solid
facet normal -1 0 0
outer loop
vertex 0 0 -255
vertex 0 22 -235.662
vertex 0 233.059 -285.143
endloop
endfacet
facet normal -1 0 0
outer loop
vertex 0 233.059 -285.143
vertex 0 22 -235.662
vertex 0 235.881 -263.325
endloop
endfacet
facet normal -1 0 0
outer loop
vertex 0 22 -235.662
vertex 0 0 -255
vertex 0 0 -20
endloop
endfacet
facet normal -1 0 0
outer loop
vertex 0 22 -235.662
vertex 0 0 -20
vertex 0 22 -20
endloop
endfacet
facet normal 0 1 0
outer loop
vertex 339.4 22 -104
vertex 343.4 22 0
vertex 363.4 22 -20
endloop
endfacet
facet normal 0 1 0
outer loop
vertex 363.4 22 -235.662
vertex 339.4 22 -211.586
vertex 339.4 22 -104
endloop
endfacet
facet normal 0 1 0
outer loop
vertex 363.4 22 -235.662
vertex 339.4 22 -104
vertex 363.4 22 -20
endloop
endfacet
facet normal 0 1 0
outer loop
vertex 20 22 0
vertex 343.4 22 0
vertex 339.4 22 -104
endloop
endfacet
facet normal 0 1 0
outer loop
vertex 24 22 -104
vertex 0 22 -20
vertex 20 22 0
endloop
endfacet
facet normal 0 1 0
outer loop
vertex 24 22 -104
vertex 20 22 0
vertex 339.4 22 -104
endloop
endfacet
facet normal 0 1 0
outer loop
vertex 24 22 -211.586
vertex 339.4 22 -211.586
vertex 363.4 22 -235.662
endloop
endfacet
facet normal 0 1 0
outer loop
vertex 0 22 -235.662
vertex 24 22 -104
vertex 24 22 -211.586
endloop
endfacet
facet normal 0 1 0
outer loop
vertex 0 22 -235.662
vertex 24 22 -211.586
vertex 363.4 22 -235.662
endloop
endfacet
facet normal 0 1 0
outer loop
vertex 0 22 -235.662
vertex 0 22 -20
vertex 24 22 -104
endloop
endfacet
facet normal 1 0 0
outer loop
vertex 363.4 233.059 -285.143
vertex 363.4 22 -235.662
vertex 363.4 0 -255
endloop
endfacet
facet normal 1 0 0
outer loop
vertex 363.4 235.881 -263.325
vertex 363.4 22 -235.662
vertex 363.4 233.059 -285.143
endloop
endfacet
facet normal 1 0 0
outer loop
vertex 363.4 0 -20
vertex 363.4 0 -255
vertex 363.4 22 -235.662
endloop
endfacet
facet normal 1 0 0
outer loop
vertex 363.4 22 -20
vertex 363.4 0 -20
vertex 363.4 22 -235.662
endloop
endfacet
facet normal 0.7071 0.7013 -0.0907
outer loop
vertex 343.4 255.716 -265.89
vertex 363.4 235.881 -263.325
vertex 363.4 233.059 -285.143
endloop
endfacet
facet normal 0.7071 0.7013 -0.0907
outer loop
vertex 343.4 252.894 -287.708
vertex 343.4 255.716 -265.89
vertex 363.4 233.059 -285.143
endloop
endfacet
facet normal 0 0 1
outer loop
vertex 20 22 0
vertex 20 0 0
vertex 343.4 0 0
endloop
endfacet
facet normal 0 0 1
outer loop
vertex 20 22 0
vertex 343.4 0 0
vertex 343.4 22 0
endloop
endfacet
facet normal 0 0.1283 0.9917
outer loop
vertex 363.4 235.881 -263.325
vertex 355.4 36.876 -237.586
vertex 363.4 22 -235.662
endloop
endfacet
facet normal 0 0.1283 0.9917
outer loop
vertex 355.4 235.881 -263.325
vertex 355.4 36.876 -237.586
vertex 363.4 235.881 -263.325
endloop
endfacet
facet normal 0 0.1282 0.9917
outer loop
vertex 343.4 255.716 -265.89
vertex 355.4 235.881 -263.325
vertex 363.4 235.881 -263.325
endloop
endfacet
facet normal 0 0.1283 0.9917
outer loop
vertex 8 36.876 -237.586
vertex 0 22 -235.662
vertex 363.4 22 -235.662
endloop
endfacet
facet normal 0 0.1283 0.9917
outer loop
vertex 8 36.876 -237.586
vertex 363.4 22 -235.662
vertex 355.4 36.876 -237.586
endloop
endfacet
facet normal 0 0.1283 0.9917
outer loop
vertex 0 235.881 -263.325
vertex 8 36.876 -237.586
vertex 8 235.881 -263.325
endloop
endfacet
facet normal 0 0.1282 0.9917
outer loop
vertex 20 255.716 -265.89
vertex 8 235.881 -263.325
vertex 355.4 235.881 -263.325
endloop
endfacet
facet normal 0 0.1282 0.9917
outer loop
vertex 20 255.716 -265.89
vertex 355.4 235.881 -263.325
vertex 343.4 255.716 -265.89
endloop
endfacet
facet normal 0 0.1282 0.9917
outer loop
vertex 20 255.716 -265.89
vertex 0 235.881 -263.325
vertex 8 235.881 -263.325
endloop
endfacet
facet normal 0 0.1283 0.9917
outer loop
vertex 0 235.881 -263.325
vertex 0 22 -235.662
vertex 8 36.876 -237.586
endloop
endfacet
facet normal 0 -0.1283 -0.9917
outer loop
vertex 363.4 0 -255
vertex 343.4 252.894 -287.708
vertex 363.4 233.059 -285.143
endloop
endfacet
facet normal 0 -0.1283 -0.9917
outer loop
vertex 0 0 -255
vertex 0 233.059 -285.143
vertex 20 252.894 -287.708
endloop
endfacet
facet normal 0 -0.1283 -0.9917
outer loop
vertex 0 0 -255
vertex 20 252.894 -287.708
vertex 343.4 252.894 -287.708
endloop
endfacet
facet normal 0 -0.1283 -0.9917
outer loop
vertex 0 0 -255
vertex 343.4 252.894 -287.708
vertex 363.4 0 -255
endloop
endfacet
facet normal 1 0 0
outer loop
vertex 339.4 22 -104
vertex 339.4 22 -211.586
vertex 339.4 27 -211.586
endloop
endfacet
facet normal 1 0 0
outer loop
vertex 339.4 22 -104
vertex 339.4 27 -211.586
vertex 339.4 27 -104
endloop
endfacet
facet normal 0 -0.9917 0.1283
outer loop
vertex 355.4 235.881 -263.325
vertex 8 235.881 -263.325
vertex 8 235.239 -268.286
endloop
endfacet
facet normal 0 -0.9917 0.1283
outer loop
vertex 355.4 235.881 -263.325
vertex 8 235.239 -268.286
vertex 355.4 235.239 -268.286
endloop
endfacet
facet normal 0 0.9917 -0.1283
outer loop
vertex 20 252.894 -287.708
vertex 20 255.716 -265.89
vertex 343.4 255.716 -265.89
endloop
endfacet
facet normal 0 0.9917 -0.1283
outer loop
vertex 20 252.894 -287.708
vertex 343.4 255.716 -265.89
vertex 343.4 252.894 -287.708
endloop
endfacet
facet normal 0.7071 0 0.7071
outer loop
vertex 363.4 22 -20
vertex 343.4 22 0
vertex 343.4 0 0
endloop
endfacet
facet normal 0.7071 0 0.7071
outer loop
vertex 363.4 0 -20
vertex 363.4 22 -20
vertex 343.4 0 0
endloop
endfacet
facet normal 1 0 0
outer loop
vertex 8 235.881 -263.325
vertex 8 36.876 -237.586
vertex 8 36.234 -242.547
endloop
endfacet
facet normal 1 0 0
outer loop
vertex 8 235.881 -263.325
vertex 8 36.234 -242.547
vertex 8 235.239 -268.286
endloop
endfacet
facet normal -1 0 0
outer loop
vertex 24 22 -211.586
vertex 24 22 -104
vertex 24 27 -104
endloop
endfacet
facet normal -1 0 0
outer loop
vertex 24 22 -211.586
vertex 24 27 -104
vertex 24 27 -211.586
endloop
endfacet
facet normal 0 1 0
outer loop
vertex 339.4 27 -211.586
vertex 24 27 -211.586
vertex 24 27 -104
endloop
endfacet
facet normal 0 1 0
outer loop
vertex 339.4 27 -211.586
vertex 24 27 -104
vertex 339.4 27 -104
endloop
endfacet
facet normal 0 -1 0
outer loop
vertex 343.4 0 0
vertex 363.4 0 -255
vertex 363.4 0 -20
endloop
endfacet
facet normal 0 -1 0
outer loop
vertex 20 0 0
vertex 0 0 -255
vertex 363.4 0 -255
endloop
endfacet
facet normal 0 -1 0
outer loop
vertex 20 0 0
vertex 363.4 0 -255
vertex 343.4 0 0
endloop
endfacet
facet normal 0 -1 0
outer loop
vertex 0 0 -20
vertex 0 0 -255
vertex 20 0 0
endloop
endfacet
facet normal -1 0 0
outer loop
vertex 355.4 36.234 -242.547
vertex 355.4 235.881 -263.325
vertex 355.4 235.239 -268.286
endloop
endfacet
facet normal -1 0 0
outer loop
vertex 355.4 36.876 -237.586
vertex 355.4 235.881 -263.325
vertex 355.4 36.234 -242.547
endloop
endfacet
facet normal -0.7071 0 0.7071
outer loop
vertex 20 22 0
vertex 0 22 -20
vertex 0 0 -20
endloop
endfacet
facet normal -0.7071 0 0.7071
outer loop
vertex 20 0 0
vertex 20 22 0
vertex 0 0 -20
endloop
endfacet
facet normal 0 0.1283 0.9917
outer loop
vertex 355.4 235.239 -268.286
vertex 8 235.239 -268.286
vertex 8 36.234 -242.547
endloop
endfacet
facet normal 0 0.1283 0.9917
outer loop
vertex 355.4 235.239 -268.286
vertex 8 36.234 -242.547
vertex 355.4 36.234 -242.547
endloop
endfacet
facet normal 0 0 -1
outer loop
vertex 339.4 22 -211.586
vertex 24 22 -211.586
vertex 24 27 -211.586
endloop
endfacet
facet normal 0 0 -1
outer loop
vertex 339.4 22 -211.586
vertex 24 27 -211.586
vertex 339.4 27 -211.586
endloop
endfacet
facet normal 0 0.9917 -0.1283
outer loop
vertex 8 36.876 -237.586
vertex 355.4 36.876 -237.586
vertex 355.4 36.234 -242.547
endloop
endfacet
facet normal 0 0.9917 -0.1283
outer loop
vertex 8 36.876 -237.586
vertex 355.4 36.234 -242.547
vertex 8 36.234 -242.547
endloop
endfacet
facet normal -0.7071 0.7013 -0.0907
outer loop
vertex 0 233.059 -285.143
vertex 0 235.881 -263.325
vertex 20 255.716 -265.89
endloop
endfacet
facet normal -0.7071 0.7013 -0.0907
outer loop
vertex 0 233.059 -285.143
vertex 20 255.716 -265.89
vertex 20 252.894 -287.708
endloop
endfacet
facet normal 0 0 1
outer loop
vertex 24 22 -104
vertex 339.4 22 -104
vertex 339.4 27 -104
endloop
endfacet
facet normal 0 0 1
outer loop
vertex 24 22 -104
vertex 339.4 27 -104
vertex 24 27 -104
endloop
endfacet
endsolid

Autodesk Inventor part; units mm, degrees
ref_plane "YZ Plane" through (0, 0, 0) normal (1, 0, 0) x (0, 1, 0)
ref_plane "XZ Plane" through (0, 0, 0) normal (0, 1, 0) x (-1, 0, 0)
ref_plane "XY Plane" through (0, 0, 0) normal (0, 0, 1) x (1, 0, 0)
sketch "Sketch1" plane through (0, 0, 0) normal (1, 0, 0) x (0, 1, 0)
  line L0 (0, 0) -> (22, 0)
  line L1 (22, 0) -> (22, -255)
  line L2 (22, -255) -> (0, -255)
  line L3 (0, -255) -> (0, 0)
  line L4 (0, -255) -> (2.8219, -233.1817)
  line L5 (2.8219, -233.1817) -> (255.7155, -265.8902)
  line L6 (255.7155, -265.8902) -> (252.8936, -287.7085)
  line L7 (252.8936, -287.7085) -> (0, -255)
  point P0 (22, -235.6622)
  dimension "d0" = 22
  dimension "d1" = 255
  dimension "d2" = 22
  dimension "d3" = 255
extrude "Extrusion1" add sketch "Sketch1" along normal blind 363.4
chamfer "Chamfer1" distance 20 angle 45 4 edges at (363.4, 254.3045, -276.7993) (0, 254.3045, -276.7993) (363.4, 11, 0) (0, 11, 0)
sketch "Sketch2" plane through (0, 22, -235.6622) normal (0, 0.1282685, 0.9917395) x (1, 0, 0)
  line L0 (8, 215.6622) -> (355.4, 215.6622)
  line L1 (355.4, 215.6622) -> (355.4, 15)
  line L2 (355.4, 15) -> (8, 15)
  line L3 (8, 15) -> (8, 215.6622)
  line L4 (0, 215.6622) -> (0, 0) projected
  line L5 (363.4, 215.6622) -> (363.4, 0) projected
  line L6 (20, 235.6622) -> (343.4, 235.6622) projected
  line L7 (0, 0) -> (363.4, 0) projected
  point P0 (0, -52.0463)
  dimension "d9" = 8
  dimension "d10" = 8
  dimension "d11" = 20
  dimension "d12" = 15
extrude "Extrusion2" cut sketch "Sketch2" against normal blind 5
sketch "Sketch4" plane through (0, 22, -235.6622) normal (0, 1, 0) x (1, 0, 0)
  line L0 (24, -24.076) -> (339.4, -24.076)
  line L1 (339.4, -24.076) -> (339.4, -131.6622)
  line L2 (339.4, -131.6622) -> (24, -131.6622)
  line L3 (24, -131.6622) -> (24, -24.076)
  line L4 (355.4, 1.924) -> (8, 1.924) projected
  line L5 (0, 0) -> (0, -215.6622) projected
  line L6 (363.4, 0) -> (363.4, -215.6622) projected
  line L7 (20, -235.6622) -> (343.4, -235.6622) projected
  dimension "d15" = 26
  dimension "d16" = 24
  dimension "d17" = 24
  dimension "d18" = 104
extrude "Extrusion3" add sketch "Sketch4" along normal blind 5
properties part number "Laptop" material "PBT Plastic"
